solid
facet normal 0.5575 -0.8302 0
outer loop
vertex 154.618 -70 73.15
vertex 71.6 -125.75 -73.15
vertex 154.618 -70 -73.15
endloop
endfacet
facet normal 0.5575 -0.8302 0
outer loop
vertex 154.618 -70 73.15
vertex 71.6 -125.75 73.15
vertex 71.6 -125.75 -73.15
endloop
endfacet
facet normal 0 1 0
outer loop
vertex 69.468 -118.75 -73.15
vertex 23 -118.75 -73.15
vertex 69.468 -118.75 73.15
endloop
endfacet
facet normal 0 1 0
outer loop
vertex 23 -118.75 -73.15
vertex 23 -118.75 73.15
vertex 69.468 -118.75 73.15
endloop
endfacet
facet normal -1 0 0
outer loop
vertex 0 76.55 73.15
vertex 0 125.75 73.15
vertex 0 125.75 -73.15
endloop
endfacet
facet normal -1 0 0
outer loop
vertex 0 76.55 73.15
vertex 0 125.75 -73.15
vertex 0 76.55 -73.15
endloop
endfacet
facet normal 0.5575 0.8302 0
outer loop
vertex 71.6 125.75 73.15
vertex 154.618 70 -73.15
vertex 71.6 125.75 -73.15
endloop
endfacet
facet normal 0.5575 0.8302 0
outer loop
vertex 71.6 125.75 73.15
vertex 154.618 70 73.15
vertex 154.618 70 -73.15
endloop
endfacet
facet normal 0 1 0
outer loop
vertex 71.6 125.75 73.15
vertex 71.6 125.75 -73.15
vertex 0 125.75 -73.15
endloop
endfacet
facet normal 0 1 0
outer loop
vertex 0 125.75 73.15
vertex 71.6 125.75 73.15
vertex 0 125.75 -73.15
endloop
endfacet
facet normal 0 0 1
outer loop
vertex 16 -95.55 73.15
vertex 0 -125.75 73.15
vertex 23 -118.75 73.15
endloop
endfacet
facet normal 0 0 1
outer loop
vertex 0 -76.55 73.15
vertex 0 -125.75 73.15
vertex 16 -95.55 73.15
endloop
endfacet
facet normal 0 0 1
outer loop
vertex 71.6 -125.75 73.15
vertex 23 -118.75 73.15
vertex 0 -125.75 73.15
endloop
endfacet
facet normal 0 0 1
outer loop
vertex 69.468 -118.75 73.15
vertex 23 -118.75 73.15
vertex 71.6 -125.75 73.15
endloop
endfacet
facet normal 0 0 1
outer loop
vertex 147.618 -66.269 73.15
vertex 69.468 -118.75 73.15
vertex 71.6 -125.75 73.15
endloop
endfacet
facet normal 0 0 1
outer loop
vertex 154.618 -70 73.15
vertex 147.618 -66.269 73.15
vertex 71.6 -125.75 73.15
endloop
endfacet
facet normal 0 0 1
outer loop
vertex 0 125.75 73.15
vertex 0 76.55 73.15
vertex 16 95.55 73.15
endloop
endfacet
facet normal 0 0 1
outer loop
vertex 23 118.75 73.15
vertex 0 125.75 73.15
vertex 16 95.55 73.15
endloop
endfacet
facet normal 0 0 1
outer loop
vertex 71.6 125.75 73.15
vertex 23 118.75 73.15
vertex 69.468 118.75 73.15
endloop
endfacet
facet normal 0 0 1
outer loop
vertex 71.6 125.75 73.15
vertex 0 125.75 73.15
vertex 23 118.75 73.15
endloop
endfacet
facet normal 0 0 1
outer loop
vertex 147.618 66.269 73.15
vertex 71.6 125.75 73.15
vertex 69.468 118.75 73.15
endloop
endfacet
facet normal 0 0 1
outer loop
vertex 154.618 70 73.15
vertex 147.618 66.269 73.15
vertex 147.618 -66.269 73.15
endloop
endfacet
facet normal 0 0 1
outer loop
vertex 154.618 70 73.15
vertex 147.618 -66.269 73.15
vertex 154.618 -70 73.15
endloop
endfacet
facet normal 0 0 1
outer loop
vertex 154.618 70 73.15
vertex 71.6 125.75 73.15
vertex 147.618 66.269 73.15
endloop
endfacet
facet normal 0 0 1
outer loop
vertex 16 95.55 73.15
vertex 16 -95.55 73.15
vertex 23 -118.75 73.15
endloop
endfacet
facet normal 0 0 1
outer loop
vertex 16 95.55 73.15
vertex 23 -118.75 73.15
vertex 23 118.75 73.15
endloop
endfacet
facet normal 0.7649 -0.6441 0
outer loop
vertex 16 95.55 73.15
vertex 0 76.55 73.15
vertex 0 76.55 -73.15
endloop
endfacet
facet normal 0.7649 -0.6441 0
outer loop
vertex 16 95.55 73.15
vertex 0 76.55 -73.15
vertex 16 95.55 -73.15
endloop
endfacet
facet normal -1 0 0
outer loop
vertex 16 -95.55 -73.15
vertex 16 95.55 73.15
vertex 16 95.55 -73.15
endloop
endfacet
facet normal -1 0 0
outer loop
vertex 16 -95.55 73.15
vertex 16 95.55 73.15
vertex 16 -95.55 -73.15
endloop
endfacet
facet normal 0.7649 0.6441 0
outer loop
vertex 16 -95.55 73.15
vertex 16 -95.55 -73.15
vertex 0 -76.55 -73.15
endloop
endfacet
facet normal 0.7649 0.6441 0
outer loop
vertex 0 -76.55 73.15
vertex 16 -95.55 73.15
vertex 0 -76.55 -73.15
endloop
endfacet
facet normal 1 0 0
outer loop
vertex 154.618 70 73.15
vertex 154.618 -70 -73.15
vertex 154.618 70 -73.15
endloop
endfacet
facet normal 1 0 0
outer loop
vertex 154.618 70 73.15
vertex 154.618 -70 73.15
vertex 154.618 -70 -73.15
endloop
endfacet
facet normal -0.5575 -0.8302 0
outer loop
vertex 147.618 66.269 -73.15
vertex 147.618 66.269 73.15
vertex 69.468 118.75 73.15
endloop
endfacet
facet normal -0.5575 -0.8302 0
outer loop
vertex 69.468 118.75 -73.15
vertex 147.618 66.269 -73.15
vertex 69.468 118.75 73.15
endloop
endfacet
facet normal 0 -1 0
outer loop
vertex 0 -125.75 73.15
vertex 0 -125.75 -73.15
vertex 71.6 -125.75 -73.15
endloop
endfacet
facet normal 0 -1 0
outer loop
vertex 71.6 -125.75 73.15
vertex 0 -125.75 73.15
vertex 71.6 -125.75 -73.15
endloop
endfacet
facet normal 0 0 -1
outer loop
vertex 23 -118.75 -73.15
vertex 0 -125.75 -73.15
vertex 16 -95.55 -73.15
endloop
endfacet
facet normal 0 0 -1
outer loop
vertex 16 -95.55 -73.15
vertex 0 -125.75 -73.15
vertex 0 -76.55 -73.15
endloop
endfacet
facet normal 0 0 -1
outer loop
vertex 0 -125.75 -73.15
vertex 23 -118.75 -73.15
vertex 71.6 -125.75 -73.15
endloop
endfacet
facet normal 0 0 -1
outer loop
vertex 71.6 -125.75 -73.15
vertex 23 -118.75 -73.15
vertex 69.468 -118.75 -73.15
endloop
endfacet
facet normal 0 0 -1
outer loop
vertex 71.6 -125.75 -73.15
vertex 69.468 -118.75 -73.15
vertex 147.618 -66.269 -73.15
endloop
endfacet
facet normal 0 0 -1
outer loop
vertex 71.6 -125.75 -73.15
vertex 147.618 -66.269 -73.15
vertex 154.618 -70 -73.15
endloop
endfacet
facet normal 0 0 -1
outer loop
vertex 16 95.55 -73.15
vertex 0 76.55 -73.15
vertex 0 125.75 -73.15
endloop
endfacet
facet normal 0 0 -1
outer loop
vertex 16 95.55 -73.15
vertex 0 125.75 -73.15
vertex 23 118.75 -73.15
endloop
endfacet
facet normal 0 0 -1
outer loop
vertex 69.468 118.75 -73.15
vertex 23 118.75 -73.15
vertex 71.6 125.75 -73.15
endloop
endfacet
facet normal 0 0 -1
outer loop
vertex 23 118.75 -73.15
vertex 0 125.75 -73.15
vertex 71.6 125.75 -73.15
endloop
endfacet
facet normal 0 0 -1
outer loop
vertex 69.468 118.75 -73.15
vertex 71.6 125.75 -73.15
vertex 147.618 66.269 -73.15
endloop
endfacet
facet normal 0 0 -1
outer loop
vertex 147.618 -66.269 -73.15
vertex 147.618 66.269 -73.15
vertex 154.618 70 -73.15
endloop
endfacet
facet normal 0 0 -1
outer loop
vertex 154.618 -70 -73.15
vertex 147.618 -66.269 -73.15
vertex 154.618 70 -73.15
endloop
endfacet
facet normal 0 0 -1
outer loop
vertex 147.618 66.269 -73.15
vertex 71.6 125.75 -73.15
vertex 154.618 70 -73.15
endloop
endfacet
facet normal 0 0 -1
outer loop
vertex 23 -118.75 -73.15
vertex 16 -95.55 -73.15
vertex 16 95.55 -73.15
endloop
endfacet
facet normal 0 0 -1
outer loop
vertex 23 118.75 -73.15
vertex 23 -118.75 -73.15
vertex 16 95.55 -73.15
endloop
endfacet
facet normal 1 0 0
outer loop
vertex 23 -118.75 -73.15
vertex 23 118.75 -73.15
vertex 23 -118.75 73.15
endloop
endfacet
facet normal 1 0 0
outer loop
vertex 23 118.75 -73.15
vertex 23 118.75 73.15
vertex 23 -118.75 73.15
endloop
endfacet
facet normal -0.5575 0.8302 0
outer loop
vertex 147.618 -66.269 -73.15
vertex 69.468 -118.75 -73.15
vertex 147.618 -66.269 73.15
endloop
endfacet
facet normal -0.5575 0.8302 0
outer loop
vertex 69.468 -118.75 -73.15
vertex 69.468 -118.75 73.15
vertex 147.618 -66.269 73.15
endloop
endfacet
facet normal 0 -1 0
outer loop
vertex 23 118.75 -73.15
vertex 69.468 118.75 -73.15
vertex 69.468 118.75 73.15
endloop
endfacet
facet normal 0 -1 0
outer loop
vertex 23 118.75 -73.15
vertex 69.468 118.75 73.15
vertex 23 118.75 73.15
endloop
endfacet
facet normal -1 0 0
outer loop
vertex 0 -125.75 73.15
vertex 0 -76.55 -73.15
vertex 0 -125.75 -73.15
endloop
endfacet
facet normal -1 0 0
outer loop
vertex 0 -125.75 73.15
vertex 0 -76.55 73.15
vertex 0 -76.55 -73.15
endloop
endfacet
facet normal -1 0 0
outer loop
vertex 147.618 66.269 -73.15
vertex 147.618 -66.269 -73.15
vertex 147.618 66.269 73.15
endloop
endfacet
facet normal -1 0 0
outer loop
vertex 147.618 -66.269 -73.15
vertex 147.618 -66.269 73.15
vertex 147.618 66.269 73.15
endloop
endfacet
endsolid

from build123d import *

# Parameters (mm, degrees)
SALIENTE_EXTRUIR1_DEPTH = 73.15


with BuildPart() as part:
    # Croquis1 → Saliente-Extruir1 (new body, symmetric)
    with BuildSketch(Plane.XY):
        Polygon((154.617693897, 70), (71.6, 125.75), (0, 125.75), (0, 76.55), (16, 95.55), (16, -95.55), (0, -76.55), (0, -125.75), (71.6, -125.75), (154.617693897, -70), align=None)
        Polygon((147.617693897, 66.26886769), (69.467692507, 118.75), (23, 118.75), (23, -118.75), (69.467692507, -118.75), (147.617693897, -66.26886769), align=None, mode=Mode.SUBTRACT)
    extrude(amount=SALIENTE_EXTRUIR1_DEPTH, both=True)


solid = part.part
